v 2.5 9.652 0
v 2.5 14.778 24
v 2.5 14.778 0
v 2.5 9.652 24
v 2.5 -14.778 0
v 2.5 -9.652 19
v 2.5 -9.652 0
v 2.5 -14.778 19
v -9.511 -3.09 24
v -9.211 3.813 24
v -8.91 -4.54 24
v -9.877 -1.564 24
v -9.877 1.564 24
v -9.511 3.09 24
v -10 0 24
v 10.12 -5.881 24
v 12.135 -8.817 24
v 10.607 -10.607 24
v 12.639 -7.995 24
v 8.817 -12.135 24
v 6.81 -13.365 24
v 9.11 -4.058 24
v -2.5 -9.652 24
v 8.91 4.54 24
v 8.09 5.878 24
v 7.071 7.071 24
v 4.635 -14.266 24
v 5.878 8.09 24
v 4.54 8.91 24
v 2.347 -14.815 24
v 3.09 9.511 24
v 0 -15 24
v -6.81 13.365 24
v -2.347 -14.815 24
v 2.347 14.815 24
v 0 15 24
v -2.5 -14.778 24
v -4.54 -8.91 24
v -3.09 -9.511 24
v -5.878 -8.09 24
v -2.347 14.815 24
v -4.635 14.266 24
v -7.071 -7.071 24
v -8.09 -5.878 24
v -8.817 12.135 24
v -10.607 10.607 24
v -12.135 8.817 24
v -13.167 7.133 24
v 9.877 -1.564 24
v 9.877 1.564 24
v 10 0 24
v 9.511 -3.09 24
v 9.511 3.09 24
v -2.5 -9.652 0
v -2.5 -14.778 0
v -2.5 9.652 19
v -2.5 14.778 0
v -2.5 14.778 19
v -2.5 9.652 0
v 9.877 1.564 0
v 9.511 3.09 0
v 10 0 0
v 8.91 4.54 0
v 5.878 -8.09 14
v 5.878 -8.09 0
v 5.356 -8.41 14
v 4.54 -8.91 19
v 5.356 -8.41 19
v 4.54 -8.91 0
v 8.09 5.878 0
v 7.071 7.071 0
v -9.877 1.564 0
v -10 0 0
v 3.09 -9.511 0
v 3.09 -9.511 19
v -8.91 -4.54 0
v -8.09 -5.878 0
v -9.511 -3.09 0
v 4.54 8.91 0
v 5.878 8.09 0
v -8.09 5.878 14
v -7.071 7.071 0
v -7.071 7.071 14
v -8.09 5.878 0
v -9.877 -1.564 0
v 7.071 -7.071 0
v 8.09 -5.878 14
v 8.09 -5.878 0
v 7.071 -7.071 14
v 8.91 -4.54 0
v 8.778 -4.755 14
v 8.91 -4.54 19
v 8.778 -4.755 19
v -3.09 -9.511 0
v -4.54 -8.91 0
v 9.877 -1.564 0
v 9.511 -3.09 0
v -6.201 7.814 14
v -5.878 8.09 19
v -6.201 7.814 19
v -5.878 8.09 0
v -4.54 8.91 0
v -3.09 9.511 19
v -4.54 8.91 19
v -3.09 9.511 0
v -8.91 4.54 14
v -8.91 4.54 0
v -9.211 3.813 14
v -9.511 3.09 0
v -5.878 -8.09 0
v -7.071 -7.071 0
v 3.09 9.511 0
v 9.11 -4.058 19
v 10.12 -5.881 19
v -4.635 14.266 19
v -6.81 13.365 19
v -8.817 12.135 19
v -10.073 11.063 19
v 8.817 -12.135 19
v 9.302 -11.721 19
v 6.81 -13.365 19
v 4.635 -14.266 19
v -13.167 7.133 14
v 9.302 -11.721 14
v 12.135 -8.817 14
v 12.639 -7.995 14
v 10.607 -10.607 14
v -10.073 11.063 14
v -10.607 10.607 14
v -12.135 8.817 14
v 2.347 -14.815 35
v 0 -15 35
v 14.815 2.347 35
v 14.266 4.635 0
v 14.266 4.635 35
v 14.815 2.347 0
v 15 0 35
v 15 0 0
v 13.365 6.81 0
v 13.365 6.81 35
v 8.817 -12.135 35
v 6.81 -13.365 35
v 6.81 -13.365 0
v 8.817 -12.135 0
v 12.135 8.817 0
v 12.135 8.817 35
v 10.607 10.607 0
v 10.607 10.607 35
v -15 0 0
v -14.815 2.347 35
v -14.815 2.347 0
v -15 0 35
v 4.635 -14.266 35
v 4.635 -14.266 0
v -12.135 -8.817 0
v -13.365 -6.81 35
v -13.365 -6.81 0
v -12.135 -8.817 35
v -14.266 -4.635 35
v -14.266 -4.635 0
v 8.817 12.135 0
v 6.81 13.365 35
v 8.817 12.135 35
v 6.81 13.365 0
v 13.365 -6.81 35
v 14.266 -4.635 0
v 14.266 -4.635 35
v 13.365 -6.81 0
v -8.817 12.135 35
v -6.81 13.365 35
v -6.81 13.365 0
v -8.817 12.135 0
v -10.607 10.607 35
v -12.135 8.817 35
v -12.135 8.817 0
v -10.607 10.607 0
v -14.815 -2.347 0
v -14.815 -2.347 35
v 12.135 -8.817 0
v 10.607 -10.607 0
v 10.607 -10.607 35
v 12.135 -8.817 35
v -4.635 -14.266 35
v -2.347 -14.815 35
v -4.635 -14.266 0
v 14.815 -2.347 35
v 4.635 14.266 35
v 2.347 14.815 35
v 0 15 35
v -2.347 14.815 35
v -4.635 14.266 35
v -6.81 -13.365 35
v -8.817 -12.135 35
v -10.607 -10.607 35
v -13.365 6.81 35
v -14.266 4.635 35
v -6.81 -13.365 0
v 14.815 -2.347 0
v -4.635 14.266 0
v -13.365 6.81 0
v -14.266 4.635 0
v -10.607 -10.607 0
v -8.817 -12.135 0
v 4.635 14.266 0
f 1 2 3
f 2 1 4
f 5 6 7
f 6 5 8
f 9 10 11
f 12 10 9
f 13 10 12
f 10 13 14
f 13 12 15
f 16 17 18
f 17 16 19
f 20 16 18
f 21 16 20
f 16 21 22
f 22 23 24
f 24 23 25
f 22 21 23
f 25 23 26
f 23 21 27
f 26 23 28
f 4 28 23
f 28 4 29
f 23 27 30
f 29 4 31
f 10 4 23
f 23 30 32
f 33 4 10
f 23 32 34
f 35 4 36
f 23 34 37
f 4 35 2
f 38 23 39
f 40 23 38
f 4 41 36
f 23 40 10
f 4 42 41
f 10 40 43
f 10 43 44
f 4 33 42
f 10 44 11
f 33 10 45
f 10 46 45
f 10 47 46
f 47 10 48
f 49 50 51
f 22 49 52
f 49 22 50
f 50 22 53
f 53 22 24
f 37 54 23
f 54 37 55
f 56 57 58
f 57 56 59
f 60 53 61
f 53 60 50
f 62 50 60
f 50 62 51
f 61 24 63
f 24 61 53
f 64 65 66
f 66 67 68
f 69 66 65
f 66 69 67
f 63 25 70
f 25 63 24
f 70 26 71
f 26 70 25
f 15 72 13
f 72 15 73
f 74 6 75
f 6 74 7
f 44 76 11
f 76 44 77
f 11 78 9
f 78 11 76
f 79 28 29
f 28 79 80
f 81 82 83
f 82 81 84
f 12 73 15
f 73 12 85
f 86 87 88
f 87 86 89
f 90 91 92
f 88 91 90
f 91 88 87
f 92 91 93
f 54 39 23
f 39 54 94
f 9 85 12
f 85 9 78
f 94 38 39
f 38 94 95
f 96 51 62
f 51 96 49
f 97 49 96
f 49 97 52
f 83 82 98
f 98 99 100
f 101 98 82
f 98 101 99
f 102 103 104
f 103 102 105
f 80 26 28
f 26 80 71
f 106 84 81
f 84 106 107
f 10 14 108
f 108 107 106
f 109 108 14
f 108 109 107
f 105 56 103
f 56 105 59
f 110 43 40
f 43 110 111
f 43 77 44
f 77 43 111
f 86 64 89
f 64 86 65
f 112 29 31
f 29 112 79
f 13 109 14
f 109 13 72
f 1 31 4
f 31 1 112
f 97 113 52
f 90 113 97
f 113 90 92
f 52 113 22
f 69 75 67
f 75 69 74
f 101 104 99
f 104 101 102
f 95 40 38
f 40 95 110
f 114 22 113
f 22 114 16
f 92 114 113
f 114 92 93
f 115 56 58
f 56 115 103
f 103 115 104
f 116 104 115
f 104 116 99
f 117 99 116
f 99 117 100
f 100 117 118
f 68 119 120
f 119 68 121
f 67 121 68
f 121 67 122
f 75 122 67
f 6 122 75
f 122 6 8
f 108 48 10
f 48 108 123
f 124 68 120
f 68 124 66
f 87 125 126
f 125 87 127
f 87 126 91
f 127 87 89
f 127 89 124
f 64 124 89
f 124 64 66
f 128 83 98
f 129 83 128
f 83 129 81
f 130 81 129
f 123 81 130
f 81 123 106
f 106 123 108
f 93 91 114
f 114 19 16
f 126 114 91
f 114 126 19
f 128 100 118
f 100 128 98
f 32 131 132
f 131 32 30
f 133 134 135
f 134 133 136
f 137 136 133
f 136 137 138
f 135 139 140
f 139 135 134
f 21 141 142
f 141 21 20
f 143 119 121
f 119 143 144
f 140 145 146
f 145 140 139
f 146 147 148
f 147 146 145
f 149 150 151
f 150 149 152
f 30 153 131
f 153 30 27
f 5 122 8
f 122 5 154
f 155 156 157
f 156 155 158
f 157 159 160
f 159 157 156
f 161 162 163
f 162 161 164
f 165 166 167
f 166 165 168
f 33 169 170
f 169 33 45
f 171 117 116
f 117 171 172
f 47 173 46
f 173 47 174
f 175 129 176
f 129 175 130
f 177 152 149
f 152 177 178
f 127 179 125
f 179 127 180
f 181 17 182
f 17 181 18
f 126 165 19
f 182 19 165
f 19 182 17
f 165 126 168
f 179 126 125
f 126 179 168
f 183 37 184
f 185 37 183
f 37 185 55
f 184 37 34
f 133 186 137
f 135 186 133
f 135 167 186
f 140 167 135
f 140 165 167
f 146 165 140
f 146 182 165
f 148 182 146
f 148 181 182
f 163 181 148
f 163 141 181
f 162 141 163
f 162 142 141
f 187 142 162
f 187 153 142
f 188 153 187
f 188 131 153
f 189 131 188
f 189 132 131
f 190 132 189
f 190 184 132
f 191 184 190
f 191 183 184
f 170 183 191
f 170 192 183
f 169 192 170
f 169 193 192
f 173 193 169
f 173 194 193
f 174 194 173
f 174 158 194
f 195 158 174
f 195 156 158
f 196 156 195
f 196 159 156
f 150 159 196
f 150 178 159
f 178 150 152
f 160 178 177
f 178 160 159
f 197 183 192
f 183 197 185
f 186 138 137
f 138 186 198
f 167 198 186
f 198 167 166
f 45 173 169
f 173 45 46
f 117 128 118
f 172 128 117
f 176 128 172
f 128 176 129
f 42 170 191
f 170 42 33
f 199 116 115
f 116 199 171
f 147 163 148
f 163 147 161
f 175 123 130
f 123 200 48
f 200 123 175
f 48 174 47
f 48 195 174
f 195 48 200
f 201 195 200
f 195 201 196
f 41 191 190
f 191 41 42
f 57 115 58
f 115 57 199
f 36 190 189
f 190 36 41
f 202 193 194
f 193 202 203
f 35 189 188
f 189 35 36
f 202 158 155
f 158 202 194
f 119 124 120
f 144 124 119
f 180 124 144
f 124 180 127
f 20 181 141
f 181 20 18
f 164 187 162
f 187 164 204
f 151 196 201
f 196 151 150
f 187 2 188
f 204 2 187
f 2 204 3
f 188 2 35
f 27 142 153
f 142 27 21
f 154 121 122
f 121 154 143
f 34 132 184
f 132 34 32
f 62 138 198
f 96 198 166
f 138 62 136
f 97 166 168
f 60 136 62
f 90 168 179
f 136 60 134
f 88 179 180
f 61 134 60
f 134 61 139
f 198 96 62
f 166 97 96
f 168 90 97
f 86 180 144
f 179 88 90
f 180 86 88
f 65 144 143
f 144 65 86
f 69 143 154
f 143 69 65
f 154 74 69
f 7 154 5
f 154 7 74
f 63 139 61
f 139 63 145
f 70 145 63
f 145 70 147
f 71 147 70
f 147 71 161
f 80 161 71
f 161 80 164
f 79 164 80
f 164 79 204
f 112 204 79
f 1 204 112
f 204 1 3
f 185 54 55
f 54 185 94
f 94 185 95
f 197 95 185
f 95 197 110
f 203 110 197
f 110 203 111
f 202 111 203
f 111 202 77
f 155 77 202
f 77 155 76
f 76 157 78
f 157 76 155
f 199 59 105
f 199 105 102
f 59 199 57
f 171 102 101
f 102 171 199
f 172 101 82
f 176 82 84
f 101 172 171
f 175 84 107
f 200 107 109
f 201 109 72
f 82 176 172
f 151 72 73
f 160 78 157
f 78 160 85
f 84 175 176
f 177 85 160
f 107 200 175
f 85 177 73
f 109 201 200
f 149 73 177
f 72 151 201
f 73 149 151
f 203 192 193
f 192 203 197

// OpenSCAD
$fn=40;
difference(){
translate([0,0,0])cylinder(35,d=30);
    union(){
        translate([-2.5,-25,-1])cube([5,50,25]);   
        translate([0,0,-1])cylinder(25,d=20);
        rotate([0,0,29])translate([-6,-25,19])cube([12,50,5]); 
        rotate([0,0,50])translate([-3,-25,14])cube([5,50,10]);
        }
}
